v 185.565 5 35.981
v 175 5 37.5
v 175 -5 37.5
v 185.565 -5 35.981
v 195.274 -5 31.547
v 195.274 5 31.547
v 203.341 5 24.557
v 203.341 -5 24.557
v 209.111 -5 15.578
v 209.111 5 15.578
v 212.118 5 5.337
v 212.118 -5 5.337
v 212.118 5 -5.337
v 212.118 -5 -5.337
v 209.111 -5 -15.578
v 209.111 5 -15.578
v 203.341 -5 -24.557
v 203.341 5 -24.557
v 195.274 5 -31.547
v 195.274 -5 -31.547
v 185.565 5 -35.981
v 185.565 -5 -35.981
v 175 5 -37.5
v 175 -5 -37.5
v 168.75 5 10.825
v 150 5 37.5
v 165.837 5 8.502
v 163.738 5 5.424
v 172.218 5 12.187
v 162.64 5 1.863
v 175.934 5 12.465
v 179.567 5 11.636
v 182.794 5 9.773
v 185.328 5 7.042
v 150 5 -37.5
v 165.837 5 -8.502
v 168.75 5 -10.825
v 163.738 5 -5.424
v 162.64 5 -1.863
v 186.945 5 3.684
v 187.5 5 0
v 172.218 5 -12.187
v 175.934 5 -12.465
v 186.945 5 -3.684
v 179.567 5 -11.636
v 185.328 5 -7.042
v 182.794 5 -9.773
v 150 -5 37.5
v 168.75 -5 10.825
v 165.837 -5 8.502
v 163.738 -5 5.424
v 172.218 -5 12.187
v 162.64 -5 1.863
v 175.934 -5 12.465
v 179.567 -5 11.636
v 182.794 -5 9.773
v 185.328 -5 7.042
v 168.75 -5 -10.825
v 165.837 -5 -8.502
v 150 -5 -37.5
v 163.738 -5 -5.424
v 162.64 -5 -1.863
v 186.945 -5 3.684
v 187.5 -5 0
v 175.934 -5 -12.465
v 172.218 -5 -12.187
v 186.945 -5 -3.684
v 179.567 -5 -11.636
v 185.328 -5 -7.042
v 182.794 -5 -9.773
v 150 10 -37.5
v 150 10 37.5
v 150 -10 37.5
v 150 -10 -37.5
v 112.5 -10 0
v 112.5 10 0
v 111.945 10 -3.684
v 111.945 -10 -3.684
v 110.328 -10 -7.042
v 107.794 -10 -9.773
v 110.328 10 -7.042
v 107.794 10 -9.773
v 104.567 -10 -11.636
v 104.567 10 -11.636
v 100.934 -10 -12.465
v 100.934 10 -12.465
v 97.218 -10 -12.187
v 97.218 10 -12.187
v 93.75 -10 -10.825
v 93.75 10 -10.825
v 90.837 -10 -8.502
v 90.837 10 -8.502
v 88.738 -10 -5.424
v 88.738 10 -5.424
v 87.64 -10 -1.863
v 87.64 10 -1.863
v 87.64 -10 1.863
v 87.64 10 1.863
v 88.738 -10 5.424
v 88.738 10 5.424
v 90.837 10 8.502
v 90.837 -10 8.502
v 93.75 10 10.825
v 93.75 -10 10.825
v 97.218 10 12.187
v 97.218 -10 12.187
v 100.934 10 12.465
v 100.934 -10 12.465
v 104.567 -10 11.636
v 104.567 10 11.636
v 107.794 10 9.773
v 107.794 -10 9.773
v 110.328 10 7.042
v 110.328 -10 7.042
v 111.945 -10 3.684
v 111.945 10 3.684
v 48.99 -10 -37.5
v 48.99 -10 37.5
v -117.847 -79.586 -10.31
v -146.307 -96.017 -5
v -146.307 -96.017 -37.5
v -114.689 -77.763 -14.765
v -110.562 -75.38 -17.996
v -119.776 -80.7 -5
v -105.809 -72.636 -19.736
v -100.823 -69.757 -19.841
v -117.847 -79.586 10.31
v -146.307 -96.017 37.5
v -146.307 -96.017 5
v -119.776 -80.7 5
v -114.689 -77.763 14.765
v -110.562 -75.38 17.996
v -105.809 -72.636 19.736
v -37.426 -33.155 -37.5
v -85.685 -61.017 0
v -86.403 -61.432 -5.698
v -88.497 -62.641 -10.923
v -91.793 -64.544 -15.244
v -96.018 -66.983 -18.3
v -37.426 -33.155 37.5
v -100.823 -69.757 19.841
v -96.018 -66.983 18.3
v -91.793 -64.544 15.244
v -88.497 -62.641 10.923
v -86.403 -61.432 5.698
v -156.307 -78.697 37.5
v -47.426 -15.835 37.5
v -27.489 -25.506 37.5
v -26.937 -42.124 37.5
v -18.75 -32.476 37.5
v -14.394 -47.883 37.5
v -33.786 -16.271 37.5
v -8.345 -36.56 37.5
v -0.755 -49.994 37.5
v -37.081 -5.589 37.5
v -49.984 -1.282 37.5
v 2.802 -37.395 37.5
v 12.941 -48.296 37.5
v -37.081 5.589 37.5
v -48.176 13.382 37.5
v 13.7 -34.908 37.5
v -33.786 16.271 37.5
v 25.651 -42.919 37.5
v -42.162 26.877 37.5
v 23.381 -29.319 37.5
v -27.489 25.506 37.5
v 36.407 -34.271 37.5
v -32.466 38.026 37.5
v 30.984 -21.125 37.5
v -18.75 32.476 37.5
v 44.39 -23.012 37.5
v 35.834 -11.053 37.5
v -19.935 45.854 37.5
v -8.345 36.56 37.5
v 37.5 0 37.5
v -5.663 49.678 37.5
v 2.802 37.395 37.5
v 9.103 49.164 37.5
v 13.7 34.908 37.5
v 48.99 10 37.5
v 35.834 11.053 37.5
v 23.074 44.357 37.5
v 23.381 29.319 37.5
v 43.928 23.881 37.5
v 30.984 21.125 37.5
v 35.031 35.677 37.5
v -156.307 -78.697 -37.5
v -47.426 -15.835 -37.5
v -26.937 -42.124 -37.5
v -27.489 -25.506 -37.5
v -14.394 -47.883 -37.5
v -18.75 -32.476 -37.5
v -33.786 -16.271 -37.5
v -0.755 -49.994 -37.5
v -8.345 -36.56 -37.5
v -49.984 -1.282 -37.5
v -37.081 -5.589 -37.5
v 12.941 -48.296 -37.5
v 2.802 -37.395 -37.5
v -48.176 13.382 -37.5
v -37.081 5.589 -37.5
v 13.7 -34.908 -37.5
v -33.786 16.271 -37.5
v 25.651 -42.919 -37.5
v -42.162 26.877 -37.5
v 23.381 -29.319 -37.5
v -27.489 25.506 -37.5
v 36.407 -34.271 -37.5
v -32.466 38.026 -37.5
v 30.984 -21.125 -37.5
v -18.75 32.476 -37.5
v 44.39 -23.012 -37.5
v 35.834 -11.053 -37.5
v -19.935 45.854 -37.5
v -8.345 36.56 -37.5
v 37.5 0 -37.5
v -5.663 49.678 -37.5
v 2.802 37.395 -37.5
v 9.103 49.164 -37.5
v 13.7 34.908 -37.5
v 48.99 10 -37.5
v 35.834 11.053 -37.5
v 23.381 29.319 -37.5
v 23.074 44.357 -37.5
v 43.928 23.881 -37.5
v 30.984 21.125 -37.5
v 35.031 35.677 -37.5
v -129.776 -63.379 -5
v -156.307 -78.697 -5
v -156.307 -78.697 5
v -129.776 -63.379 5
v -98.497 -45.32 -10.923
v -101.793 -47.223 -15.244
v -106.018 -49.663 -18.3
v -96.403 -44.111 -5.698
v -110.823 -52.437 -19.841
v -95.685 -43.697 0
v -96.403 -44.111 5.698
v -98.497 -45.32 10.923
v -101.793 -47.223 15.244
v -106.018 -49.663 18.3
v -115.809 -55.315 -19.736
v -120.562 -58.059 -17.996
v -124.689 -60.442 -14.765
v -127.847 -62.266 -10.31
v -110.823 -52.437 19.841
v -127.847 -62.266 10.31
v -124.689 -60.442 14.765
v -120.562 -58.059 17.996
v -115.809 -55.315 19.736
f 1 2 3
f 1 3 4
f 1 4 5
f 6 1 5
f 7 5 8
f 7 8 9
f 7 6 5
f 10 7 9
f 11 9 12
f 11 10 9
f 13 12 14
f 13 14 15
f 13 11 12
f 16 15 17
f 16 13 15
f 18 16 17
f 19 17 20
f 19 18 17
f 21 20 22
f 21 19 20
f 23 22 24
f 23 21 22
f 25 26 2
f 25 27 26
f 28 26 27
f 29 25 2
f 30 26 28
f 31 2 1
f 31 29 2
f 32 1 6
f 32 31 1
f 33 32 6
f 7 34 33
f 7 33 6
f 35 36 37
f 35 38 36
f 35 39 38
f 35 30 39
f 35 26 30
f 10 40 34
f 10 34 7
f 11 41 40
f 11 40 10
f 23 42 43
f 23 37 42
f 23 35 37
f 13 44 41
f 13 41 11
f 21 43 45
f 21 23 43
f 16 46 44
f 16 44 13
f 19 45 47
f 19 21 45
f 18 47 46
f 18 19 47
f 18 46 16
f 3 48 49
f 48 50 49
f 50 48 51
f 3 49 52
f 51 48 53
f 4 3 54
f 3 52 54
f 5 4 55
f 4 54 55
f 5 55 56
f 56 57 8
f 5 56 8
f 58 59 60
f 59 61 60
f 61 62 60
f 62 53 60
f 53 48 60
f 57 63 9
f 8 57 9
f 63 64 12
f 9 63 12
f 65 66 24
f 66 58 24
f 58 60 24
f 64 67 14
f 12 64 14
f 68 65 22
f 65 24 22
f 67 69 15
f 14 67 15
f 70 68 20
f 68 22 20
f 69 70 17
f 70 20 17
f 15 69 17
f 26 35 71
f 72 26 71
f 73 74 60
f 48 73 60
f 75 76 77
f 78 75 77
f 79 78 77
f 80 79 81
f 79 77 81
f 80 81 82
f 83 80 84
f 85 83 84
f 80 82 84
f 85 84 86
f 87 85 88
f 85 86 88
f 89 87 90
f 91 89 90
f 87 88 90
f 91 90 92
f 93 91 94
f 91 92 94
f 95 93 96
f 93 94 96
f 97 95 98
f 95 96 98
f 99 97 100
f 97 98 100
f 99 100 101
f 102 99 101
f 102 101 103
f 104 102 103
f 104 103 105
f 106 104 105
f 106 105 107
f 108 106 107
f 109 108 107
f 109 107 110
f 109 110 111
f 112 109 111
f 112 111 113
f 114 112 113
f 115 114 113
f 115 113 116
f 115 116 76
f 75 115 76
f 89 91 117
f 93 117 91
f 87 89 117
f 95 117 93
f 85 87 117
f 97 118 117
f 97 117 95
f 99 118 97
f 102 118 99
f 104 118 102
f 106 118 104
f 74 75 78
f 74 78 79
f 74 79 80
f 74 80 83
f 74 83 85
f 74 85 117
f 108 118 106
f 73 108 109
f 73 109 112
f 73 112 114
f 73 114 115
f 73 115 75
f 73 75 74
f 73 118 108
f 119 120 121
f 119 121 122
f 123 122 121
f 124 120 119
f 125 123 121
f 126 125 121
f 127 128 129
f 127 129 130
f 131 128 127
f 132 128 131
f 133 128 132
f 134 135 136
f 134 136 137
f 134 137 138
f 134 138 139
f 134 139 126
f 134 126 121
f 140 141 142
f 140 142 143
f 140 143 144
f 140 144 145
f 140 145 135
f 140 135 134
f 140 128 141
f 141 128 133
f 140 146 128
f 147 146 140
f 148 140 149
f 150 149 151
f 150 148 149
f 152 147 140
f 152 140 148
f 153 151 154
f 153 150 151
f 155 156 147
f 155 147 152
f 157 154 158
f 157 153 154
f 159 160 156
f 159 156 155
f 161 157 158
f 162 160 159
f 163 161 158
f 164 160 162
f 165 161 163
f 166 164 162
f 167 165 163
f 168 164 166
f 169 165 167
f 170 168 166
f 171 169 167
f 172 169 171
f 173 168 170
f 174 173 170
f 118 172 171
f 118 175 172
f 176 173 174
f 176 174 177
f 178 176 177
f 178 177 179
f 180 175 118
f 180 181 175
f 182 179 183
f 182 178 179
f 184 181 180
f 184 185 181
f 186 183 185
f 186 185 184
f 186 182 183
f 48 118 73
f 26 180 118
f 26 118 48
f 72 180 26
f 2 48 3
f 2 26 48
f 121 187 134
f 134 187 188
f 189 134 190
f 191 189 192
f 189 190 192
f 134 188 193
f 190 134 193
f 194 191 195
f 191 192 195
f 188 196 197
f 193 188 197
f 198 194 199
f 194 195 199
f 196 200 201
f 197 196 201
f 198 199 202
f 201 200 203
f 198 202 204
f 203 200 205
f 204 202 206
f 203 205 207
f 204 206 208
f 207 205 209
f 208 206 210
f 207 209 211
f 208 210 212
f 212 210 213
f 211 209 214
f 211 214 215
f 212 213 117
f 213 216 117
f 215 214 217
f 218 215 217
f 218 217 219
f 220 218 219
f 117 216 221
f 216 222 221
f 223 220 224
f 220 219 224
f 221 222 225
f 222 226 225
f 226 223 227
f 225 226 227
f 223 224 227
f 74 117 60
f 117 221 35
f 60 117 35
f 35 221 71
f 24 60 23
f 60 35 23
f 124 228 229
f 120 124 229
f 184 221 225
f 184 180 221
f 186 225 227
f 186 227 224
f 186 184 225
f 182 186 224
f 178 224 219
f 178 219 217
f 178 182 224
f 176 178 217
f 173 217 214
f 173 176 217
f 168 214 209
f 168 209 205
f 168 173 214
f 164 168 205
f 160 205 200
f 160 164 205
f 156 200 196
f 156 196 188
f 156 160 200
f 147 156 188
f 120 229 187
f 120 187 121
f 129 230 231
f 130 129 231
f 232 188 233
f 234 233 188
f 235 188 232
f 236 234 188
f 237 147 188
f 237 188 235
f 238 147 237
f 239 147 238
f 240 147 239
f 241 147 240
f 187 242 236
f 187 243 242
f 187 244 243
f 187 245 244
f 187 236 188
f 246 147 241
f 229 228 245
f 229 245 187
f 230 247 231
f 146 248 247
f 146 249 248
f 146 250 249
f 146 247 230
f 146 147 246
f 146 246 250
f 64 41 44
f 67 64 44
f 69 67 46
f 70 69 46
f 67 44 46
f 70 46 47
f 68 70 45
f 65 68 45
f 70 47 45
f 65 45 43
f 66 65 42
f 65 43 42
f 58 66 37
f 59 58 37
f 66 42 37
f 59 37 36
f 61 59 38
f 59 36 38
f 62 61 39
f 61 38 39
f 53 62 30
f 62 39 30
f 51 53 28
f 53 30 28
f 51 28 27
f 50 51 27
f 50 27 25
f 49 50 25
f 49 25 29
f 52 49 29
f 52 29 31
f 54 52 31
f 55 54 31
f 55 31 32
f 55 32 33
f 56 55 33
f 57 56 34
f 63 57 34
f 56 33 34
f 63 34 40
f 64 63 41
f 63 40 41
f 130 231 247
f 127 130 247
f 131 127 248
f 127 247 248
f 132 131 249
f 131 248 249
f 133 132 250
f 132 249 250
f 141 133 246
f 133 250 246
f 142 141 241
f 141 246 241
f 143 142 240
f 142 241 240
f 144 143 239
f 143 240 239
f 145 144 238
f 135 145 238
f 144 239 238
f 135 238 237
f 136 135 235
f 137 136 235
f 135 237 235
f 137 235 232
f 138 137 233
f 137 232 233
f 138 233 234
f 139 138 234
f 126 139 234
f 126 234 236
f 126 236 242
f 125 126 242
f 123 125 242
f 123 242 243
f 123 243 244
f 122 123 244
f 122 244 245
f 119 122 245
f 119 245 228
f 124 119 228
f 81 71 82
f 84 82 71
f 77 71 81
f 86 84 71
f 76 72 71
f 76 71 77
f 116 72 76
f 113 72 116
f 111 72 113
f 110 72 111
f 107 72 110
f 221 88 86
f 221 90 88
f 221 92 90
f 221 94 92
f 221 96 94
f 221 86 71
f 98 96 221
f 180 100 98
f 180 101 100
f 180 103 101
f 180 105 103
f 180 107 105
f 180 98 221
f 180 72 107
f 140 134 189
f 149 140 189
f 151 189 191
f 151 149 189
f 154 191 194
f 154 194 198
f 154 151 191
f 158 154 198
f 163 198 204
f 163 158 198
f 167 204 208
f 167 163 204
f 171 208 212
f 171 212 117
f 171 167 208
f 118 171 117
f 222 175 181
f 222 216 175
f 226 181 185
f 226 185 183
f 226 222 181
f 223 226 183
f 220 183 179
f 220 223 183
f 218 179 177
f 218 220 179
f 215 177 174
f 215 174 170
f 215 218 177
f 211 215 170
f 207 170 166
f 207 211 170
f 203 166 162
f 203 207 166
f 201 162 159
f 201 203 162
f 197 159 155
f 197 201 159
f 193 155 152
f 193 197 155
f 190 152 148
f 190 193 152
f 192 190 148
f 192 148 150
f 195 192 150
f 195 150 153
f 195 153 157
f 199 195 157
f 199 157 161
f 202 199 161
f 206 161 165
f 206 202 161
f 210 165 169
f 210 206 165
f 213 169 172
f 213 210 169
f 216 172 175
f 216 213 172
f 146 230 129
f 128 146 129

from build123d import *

# Parameters (mm, degrees)
IZIM1_R                     = 50
IZIM1_R_2                   = 37.5
IZIM1_W                     = 25
IZIM1_H                     = 10
Y_KSEKLIK_EKSTR_ZYON1_DEPTH = 37.5
Y_KSEKLIK_EKSTR_ZYON2_DEPTH = 10
IZIM3_R                     = 12.5
KES_EKSTR_ZYON1_DEPTH       = 10
IZIM4_R                     = 12.5
KES_EKSTR_ZYON2_DEPTH       = 107.017280086
KES_EKSTR_ZYON3_DEPTH       = 200.403403757


with BuildPart() as part:
    # Çizim1 → Yükseklik-Ekstrüzyon1 (new body, symmetric)
    with BuildSketch(Plane.XY):
        with BuildLine():
            Line((-156.306807514, -78.69677201), (-146.306807514, -96.017280086))
            Line((-146.306807514, -96.017280086), (-37.426406871, -33.155151466))
            ThreePointArc((-37.426406871, -33.155151466), (-43.301270189, -25), (-47.426406871, -15.83464339))
            Line((-47.426406871, -15.83464339), (-156.306807514, -78.69677201))
        make_face()
        Circle(IZIM1_R)
        Circle(IZIM1_R_2, mode=Mode.SUBTRACT)
        with BuildLine():
            ThreePointArc((50, 0), (49.74680765, -5.0254481), (48.989794856, -10))
            Line((48.989794856, -10), (150, -10))
            Line((150, -10), (150, -5))
            Line((150, -5), (150, 5))
            Line((150, 5), (150, 10))
            Line((150, 10), (48.989794856, 10))
            ThreePointArc((48.989794856, 10), (49.74680765, 5.0254481), (50, 0))
        make_face()
        with Locations((162.5, 0)):
            Rectangle(IZIM1_W, IZIM1_H)
    extrude(amount=Y_KSEKLIK_EKSTR_ZYON1_DEPTH, both=True)

    # Çizim2 → Yükseklik-Ekstrüzyon2 (add)
    with BuildSketch(Plane(origin=(0, 5, 0), x_dir=(1, 0, 0), z_dir=(0, 1, 0))):
        with BuildLine():
            Line((175, 37.5), (175, -37.5))
            ThreePointArc((175, -37.5), (212.5, 0), (175, 37.5))
        make_face()
    extrude(amount=-Y_KSEKLIK_EKSTR_ZYON2_DEPTH)

    # Çizim3 → Kes-Ekstrüzyon1 (cut)
    with BuildSketch(Plane(origin=(0, 5, 0), x_dir=(1, 0, 0), z_dir=(0, 1, 0))):
        with Locations((175, 0)):
            Circle(IZIM3_R)
    extrude(amount=-KES_EKSTR_ZYON1_DEPTH, mode=Mode.SUBTRACT)

    # Çizim4 → Kes-Ekstrüzyon2 (cut, through all)
    with BuildSketch(Plane(origin=(0, 10, 0), x_dir=(1, 0, 0), z_dir=(0, 1, 0))):
        with Locations((100, 0)):
            Circle(IZIM4_R)
    extrude(amount=-KES_EKSTR_ZYON2_DEPTH, mode=Mode.SUBTRACT)

    # Çizim5 → Kes-Ekstrüzyon3 (cut, through all)
    with BuildSketch(Plane(origin=(-5, 8.660254038, 0), x_dir=(0.866025404, 0.5, 0), z_dir=(-0.5, 0.866025404, 0))):
        with BuildLine():
            Line((-174.714052097, 5), (-174.714052097, -5))
            Line((-174.714052097, -5), (-144.078968828, -5))
            ThreePointArc((-144.078968828, -5), (-104.714052097, 0), (-144.078968828, 5))
            Line((-144.078968828, 5), (-174.714052097, 5))
        make_face()
    extrude(amount=-KES_EKSTR_ZYON3_DEPTH, mode=Mode.SUBTRACT)


solid = part.part
